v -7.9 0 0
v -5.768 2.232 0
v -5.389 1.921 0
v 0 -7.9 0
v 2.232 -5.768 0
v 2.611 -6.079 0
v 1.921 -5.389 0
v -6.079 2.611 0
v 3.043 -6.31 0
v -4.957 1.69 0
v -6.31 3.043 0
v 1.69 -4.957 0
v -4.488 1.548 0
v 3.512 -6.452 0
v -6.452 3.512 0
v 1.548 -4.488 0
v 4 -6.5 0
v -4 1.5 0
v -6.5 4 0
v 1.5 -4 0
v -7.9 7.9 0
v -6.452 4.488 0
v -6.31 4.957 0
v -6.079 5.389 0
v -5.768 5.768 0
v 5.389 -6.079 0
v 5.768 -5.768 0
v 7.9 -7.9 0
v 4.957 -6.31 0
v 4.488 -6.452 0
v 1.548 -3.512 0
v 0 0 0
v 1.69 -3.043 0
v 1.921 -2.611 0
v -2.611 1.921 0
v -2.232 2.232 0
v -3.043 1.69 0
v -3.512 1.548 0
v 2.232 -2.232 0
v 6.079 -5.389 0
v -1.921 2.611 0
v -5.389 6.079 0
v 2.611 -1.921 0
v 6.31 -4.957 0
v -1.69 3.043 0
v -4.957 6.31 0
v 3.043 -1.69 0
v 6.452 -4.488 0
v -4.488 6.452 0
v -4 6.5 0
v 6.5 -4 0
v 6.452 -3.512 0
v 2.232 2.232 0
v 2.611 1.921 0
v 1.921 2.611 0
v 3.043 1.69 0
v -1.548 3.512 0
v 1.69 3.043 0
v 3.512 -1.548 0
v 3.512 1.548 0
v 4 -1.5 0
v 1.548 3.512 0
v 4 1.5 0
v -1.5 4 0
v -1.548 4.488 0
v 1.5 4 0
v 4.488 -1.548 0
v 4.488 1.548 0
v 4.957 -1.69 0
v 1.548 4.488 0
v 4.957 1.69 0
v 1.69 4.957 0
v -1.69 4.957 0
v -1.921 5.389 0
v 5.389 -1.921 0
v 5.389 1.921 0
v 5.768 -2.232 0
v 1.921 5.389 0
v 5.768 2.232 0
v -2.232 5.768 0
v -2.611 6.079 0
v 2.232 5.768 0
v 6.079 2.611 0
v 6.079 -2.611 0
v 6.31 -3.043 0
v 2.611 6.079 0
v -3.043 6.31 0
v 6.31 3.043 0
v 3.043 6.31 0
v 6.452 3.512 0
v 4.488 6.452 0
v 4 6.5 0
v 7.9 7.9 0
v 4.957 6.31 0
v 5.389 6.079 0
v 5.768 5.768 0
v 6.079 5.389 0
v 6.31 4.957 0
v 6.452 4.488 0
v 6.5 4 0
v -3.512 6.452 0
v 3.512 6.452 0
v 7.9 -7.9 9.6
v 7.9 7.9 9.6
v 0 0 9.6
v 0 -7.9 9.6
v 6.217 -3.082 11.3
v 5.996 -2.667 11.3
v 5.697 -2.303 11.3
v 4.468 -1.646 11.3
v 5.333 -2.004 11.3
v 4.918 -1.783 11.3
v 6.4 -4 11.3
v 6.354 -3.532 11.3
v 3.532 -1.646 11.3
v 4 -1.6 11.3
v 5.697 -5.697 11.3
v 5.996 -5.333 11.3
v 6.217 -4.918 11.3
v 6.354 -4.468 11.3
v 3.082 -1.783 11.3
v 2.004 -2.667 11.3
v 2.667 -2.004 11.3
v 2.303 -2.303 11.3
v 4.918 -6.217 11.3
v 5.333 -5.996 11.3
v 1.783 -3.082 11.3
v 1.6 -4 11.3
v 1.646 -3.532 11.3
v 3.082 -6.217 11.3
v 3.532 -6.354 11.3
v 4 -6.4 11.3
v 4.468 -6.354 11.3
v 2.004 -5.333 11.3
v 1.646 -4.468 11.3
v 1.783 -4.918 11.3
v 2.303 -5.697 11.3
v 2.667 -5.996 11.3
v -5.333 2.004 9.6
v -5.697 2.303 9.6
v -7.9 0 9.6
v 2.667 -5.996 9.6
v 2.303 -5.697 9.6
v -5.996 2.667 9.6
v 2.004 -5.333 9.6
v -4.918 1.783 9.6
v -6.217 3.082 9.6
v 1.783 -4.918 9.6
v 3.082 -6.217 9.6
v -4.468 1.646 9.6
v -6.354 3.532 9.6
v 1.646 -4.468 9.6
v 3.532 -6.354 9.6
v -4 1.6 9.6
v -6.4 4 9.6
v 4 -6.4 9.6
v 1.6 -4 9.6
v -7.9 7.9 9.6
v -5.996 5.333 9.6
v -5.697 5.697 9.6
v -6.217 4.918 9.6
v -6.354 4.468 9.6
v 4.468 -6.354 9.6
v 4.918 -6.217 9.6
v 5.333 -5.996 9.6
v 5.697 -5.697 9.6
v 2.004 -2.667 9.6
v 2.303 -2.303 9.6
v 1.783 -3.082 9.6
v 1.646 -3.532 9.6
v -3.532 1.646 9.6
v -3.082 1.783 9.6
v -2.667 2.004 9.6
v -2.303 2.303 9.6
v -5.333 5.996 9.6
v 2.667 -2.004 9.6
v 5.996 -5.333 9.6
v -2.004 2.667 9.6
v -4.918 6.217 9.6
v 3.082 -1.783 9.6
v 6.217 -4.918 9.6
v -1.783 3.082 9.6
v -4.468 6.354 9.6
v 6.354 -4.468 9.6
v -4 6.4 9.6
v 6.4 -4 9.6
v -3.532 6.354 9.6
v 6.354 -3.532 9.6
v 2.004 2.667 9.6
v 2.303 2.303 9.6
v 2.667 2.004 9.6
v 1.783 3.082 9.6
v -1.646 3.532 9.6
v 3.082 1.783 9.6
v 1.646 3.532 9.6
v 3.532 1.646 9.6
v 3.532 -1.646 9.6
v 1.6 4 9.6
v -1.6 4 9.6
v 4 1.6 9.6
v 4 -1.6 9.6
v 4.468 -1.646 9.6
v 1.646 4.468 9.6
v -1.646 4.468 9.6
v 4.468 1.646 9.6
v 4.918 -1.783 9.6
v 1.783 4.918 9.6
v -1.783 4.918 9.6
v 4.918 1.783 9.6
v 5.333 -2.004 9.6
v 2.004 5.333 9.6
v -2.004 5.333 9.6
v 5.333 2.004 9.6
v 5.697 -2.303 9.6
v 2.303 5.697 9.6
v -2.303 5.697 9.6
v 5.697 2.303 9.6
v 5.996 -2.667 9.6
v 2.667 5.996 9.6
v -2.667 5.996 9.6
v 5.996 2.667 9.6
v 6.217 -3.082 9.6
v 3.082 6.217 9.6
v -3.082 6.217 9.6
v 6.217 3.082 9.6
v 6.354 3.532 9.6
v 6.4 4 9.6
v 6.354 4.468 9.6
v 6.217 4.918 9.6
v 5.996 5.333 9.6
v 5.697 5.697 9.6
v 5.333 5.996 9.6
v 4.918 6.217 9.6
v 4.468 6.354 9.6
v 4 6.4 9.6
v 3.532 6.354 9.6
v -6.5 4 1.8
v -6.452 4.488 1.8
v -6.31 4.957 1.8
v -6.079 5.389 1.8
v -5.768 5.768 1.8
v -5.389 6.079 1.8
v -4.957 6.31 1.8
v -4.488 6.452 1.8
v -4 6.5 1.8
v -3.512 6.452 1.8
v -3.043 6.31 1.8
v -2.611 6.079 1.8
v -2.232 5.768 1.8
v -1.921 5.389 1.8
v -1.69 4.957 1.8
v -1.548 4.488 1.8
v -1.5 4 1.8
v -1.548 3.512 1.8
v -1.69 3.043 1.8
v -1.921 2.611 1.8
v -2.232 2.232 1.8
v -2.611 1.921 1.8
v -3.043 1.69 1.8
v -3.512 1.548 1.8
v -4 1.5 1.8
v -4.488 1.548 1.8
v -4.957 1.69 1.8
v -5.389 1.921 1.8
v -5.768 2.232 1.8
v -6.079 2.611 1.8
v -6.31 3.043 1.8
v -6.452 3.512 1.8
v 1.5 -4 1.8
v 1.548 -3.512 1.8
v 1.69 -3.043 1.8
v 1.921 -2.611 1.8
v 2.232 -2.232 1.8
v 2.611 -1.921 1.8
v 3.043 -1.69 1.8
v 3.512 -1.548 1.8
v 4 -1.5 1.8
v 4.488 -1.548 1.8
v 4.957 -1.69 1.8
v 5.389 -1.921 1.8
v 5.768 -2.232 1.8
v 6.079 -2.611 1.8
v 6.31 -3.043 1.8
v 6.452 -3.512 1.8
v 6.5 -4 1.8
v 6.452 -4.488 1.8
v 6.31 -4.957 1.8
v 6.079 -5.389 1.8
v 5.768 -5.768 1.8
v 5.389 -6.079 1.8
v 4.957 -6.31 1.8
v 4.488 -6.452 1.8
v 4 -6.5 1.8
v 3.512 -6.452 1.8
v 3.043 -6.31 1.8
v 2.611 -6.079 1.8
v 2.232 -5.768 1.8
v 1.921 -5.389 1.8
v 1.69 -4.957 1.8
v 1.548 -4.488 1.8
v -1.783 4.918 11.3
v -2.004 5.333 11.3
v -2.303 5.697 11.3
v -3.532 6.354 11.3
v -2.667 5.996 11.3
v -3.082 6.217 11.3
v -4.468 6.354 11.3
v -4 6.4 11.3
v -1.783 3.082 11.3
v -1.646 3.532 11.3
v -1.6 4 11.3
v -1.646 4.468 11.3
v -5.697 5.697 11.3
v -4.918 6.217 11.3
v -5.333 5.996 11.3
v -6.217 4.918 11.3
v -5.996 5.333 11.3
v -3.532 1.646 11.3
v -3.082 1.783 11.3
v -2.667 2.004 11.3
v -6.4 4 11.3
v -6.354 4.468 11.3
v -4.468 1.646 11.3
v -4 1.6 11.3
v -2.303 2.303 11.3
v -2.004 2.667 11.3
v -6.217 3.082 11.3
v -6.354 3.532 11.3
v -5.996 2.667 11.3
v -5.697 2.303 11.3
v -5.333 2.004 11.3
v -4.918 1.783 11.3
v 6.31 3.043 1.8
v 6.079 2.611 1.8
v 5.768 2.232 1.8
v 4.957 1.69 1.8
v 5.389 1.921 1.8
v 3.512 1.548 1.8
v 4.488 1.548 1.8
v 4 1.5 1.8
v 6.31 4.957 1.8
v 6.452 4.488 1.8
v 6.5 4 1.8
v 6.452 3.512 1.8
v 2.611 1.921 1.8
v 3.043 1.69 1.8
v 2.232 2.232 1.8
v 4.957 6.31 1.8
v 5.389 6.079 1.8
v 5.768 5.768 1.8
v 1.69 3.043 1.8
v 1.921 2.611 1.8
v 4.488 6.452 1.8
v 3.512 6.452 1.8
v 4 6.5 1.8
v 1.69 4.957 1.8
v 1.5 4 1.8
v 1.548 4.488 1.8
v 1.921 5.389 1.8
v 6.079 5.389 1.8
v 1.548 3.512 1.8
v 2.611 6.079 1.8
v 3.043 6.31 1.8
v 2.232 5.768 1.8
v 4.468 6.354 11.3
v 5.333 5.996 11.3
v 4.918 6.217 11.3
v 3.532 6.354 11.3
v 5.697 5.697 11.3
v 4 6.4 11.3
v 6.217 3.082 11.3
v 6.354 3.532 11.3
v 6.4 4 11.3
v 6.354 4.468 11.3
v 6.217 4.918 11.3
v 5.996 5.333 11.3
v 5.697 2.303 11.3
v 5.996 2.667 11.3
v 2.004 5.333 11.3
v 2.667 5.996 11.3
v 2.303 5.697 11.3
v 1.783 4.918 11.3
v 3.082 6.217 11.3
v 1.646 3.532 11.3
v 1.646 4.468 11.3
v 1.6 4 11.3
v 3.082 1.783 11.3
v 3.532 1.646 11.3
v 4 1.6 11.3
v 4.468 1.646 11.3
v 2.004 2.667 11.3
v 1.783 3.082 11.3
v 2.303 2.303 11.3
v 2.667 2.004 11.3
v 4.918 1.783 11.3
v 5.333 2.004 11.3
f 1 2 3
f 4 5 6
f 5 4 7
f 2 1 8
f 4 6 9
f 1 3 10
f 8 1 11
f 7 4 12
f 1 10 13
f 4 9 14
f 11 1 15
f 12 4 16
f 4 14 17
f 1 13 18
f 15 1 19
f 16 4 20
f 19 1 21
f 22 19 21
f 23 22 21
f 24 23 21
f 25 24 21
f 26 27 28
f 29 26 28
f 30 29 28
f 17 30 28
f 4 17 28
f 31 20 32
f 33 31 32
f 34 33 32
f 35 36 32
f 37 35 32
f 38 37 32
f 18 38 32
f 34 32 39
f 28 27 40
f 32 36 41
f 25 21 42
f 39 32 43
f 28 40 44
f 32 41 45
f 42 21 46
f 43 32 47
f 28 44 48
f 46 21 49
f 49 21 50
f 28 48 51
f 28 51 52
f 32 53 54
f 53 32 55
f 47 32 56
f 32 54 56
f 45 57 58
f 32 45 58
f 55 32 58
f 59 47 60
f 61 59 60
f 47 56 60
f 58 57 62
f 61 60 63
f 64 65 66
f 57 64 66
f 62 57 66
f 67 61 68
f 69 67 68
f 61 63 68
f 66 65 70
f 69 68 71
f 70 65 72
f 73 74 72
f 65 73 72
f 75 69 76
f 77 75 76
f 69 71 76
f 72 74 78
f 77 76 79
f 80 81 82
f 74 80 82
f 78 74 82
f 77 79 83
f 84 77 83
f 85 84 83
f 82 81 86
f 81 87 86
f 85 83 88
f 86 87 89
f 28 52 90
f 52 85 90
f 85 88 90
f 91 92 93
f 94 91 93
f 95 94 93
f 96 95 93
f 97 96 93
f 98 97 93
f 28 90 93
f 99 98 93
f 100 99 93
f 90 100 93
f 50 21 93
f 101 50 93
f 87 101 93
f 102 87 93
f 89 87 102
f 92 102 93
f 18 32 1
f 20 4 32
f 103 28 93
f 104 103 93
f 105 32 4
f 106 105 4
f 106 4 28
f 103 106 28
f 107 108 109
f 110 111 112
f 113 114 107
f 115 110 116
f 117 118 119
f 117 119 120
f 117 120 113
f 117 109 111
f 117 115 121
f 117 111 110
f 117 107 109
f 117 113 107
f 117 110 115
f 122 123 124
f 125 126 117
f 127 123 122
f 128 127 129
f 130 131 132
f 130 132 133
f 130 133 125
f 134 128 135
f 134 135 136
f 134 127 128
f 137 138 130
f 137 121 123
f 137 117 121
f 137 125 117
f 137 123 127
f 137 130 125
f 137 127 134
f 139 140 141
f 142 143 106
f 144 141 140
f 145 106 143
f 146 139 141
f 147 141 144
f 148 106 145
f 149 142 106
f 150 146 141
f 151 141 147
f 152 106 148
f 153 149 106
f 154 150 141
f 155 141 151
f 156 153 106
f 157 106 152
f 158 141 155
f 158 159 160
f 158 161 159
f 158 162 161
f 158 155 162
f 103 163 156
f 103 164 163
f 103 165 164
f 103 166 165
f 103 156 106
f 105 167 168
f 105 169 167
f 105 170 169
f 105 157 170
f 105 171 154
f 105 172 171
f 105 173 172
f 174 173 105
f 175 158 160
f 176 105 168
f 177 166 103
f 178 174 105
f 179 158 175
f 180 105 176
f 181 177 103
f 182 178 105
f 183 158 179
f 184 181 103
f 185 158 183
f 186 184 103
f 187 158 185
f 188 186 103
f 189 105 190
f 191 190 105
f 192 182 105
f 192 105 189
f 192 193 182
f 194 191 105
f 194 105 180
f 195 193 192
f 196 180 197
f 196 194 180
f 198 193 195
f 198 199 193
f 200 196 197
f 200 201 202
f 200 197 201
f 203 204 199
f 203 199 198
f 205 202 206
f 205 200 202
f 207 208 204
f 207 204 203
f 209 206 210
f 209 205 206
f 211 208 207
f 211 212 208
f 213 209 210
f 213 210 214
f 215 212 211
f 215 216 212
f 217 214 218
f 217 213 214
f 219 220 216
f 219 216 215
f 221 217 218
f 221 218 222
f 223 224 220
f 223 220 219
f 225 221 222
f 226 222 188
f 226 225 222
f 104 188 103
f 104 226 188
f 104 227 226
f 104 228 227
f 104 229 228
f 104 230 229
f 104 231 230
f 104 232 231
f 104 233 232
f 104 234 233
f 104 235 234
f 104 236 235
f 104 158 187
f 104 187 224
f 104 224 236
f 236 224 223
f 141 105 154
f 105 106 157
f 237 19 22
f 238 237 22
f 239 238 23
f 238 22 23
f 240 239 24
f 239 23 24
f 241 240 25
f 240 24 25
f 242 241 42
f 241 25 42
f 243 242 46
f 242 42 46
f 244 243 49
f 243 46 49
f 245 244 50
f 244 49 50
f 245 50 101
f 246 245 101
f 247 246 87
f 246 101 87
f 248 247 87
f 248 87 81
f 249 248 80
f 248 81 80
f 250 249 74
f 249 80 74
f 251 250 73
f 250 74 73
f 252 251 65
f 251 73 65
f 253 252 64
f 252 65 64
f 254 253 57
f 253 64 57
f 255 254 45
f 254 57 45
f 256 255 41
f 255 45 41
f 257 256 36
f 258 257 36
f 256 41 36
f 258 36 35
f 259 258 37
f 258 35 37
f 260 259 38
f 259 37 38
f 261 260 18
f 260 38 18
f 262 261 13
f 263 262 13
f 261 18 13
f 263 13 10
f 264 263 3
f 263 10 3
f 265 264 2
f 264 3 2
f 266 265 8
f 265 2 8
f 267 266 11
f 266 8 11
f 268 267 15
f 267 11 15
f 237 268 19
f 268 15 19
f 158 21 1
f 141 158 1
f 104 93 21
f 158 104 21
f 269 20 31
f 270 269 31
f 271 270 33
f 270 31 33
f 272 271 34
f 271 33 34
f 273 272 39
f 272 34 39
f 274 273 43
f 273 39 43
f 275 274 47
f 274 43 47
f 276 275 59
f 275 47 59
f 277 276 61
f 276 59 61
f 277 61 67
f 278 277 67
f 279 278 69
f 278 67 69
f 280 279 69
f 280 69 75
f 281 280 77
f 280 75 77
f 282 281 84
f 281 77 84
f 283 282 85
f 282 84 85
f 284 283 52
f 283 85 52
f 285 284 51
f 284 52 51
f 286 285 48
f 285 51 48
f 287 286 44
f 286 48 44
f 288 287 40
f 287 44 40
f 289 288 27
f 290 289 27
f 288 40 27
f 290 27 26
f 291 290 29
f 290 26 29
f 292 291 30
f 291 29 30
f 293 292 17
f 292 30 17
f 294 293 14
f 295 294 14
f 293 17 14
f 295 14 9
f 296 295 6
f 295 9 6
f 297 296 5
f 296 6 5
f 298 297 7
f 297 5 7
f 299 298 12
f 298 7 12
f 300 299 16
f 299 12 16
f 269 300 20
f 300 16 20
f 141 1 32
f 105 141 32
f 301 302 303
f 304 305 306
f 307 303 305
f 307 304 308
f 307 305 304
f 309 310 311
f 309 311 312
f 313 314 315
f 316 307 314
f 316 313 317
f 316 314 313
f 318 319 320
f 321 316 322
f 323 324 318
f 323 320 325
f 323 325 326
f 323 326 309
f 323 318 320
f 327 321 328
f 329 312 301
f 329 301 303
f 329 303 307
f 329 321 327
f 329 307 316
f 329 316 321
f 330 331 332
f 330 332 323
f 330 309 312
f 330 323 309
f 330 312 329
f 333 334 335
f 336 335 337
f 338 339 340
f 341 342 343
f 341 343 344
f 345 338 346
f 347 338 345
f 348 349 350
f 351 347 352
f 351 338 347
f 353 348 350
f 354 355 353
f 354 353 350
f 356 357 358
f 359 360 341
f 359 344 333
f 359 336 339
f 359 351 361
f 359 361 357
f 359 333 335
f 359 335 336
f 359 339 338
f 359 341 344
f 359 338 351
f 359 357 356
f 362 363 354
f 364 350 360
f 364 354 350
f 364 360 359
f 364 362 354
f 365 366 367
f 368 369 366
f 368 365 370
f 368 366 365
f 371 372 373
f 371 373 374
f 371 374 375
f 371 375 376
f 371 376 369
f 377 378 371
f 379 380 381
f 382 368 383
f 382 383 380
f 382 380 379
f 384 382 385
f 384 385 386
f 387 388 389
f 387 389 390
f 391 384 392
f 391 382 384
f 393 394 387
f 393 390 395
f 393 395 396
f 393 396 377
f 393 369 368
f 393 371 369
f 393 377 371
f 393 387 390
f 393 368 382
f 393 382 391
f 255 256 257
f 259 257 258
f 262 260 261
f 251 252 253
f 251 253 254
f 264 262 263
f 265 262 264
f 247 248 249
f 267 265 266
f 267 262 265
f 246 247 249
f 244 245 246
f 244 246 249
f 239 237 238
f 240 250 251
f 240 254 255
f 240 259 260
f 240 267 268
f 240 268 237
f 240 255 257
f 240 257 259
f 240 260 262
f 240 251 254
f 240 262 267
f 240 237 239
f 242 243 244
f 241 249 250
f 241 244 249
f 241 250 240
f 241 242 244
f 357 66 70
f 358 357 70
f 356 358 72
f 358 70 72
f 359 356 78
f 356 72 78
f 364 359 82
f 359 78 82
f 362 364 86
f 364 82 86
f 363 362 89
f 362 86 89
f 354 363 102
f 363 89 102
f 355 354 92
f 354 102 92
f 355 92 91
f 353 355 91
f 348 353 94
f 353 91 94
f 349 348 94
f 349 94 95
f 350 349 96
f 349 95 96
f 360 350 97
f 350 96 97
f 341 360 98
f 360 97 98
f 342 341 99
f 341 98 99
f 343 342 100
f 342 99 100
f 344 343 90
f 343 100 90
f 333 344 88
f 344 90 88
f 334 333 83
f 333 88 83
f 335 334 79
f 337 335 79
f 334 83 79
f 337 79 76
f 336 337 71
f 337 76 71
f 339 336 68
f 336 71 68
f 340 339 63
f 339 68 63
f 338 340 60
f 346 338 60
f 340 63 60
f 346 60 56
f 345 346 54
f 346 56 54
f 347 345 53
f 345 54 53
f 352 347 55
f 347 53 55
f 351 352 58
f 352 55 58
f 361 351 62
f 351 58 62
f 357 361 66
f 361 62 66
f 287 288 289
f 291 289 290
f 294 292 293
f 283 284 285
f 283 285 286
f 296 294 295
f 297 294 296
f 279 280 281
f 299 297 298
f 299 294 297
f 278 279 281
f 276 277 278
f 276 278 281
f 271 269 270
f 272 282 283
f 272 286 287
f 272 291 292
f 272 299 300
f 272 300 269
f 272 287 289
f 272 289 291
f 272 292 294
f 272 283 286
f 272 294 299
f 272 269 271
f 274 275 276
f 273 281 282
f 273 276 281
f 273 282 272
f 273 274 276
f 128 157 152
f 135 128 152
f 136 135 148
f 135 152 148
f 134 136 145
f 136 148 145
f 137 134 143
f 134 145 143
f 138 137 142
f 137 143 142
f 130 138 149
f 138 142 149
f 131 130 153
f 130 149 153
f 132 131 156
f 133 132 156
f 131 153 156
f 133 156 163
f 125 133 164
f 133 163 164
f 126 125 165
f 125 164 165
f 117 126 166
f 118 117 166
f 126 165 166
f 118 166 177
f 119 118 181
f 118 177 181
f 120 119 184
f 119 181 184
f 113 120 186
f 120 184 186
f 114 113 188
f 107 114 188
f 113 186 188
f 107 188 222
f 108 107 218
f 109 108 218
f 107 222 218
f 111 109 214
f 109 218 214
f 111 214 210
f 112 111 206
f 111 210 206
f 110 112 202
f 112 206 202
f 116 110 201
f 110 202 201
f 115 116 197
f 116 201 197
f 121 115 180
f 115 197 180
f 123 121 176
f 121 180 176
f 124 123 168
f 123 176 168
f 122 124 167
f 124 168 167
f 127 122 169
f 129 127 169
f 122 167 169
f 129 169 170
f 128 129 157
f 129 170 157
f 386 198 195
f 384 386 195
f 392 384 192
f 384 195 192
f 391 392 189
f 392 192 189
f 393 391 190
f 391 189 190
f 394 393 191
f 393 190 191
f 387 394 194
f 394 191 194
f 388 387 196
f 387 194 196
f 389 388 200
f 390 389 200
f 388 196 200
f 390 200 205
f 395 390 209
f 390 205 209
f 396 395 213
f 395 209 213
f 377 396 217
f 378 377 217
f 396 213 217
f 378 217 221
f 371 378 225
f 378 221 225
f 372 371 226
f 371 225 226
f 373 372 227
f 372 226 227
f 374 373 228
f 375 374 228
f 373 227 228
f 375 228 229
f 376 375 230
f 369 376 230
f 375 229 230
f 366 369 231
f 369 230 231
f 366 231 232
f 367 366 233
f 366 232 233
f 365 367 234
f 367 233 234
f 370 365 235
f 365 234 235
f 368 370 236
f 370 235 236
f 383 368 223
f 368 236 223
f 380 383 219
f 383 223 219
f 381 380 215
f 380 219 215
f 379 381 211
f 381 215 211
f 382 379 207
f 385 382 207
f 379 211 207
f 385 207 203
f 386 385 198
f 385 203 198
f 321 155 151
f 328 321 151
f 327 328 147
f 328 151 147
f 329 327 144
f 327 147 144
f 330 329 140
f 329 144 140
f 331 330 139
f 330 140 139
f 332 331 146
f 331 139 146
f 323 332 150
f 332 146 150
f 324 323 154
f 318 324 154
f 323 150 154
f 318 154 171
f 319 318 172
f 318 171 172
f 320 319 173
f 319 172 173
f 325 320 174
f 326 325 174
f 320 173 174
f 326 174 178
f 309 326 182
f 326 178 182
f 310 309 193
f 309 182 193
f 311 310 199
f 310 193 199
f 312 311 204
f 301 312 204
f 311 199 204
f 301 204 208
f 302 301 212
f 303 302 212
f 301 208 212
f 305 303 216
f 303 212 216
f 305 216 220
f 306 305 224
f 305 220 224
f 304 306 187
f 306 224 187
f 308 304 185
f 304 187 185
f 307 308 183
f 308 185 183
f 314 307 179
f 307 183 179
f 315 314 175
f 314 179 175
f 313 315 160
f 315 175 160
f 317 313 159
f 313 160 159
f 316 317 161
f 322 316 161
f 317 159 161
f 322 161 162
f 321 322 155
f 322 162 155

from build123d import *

# Parameters (mm, degrees)
EXTRUDE_1_DEPTH     = 9.6
SKETCH_2_R          = 2.4
EXTRUDE_2_DEPTH     = 1.7
SKETCH_3_R          = 2.5
CUT_EXTRUDE_1_DEPTH = 1.8


with BuildPart() as part:
    # Эскиз1 → Бобышка-Вытянуть1 (new body)
    with BuildSketch(Plane.XY):
        Polygon((7.9, 7.9), (-7.9, 7.9), (-7.9, 0), (0, 0), (0, -7.9), (7.9, -7.9), align=None)
    extrude(amount=EXTRUDE_1_DEPTH)

    # Эскиз2 → Бобышка-Вытянуть2 (add)
    with BuildSketch(Plane.XY.offset(9.6)):
        with Locations(Location((-4, 4, 0), (0, 0, 180))):
            Circle(SKETCH_2_R)
        with Locations(Location((4, 4, 0), (0, 0, 180))):
            Circle(SKETCH_2_R)
        with Locations(Location((4, -4, 0), (0, 0, 180))):
            Circle(SKETCH_2_R)
    extrude(amount=EXTRUDE_2_DEPTH)

    # Эскиз3 → Вырез-Вытянуть1 (cut)
    with BuildSketch(Plane(origin=(0, 0, 0), x_dir=(-1, 0, 0), z_dir=(0, 0, -1))):
        with Locations((4, 4)):
            Circle(SKETCH_3_R)
        with Locations((-4, 4)):
            Circle(SKETCH_3_R)
        with Locations((-4, -4)):
            Circle(SKETCH_3_R)
    extrude(amount=-CUT_EXTRUDE_1_DEPTH, mode=Mode.SUBTRACT)


solid = part.part
